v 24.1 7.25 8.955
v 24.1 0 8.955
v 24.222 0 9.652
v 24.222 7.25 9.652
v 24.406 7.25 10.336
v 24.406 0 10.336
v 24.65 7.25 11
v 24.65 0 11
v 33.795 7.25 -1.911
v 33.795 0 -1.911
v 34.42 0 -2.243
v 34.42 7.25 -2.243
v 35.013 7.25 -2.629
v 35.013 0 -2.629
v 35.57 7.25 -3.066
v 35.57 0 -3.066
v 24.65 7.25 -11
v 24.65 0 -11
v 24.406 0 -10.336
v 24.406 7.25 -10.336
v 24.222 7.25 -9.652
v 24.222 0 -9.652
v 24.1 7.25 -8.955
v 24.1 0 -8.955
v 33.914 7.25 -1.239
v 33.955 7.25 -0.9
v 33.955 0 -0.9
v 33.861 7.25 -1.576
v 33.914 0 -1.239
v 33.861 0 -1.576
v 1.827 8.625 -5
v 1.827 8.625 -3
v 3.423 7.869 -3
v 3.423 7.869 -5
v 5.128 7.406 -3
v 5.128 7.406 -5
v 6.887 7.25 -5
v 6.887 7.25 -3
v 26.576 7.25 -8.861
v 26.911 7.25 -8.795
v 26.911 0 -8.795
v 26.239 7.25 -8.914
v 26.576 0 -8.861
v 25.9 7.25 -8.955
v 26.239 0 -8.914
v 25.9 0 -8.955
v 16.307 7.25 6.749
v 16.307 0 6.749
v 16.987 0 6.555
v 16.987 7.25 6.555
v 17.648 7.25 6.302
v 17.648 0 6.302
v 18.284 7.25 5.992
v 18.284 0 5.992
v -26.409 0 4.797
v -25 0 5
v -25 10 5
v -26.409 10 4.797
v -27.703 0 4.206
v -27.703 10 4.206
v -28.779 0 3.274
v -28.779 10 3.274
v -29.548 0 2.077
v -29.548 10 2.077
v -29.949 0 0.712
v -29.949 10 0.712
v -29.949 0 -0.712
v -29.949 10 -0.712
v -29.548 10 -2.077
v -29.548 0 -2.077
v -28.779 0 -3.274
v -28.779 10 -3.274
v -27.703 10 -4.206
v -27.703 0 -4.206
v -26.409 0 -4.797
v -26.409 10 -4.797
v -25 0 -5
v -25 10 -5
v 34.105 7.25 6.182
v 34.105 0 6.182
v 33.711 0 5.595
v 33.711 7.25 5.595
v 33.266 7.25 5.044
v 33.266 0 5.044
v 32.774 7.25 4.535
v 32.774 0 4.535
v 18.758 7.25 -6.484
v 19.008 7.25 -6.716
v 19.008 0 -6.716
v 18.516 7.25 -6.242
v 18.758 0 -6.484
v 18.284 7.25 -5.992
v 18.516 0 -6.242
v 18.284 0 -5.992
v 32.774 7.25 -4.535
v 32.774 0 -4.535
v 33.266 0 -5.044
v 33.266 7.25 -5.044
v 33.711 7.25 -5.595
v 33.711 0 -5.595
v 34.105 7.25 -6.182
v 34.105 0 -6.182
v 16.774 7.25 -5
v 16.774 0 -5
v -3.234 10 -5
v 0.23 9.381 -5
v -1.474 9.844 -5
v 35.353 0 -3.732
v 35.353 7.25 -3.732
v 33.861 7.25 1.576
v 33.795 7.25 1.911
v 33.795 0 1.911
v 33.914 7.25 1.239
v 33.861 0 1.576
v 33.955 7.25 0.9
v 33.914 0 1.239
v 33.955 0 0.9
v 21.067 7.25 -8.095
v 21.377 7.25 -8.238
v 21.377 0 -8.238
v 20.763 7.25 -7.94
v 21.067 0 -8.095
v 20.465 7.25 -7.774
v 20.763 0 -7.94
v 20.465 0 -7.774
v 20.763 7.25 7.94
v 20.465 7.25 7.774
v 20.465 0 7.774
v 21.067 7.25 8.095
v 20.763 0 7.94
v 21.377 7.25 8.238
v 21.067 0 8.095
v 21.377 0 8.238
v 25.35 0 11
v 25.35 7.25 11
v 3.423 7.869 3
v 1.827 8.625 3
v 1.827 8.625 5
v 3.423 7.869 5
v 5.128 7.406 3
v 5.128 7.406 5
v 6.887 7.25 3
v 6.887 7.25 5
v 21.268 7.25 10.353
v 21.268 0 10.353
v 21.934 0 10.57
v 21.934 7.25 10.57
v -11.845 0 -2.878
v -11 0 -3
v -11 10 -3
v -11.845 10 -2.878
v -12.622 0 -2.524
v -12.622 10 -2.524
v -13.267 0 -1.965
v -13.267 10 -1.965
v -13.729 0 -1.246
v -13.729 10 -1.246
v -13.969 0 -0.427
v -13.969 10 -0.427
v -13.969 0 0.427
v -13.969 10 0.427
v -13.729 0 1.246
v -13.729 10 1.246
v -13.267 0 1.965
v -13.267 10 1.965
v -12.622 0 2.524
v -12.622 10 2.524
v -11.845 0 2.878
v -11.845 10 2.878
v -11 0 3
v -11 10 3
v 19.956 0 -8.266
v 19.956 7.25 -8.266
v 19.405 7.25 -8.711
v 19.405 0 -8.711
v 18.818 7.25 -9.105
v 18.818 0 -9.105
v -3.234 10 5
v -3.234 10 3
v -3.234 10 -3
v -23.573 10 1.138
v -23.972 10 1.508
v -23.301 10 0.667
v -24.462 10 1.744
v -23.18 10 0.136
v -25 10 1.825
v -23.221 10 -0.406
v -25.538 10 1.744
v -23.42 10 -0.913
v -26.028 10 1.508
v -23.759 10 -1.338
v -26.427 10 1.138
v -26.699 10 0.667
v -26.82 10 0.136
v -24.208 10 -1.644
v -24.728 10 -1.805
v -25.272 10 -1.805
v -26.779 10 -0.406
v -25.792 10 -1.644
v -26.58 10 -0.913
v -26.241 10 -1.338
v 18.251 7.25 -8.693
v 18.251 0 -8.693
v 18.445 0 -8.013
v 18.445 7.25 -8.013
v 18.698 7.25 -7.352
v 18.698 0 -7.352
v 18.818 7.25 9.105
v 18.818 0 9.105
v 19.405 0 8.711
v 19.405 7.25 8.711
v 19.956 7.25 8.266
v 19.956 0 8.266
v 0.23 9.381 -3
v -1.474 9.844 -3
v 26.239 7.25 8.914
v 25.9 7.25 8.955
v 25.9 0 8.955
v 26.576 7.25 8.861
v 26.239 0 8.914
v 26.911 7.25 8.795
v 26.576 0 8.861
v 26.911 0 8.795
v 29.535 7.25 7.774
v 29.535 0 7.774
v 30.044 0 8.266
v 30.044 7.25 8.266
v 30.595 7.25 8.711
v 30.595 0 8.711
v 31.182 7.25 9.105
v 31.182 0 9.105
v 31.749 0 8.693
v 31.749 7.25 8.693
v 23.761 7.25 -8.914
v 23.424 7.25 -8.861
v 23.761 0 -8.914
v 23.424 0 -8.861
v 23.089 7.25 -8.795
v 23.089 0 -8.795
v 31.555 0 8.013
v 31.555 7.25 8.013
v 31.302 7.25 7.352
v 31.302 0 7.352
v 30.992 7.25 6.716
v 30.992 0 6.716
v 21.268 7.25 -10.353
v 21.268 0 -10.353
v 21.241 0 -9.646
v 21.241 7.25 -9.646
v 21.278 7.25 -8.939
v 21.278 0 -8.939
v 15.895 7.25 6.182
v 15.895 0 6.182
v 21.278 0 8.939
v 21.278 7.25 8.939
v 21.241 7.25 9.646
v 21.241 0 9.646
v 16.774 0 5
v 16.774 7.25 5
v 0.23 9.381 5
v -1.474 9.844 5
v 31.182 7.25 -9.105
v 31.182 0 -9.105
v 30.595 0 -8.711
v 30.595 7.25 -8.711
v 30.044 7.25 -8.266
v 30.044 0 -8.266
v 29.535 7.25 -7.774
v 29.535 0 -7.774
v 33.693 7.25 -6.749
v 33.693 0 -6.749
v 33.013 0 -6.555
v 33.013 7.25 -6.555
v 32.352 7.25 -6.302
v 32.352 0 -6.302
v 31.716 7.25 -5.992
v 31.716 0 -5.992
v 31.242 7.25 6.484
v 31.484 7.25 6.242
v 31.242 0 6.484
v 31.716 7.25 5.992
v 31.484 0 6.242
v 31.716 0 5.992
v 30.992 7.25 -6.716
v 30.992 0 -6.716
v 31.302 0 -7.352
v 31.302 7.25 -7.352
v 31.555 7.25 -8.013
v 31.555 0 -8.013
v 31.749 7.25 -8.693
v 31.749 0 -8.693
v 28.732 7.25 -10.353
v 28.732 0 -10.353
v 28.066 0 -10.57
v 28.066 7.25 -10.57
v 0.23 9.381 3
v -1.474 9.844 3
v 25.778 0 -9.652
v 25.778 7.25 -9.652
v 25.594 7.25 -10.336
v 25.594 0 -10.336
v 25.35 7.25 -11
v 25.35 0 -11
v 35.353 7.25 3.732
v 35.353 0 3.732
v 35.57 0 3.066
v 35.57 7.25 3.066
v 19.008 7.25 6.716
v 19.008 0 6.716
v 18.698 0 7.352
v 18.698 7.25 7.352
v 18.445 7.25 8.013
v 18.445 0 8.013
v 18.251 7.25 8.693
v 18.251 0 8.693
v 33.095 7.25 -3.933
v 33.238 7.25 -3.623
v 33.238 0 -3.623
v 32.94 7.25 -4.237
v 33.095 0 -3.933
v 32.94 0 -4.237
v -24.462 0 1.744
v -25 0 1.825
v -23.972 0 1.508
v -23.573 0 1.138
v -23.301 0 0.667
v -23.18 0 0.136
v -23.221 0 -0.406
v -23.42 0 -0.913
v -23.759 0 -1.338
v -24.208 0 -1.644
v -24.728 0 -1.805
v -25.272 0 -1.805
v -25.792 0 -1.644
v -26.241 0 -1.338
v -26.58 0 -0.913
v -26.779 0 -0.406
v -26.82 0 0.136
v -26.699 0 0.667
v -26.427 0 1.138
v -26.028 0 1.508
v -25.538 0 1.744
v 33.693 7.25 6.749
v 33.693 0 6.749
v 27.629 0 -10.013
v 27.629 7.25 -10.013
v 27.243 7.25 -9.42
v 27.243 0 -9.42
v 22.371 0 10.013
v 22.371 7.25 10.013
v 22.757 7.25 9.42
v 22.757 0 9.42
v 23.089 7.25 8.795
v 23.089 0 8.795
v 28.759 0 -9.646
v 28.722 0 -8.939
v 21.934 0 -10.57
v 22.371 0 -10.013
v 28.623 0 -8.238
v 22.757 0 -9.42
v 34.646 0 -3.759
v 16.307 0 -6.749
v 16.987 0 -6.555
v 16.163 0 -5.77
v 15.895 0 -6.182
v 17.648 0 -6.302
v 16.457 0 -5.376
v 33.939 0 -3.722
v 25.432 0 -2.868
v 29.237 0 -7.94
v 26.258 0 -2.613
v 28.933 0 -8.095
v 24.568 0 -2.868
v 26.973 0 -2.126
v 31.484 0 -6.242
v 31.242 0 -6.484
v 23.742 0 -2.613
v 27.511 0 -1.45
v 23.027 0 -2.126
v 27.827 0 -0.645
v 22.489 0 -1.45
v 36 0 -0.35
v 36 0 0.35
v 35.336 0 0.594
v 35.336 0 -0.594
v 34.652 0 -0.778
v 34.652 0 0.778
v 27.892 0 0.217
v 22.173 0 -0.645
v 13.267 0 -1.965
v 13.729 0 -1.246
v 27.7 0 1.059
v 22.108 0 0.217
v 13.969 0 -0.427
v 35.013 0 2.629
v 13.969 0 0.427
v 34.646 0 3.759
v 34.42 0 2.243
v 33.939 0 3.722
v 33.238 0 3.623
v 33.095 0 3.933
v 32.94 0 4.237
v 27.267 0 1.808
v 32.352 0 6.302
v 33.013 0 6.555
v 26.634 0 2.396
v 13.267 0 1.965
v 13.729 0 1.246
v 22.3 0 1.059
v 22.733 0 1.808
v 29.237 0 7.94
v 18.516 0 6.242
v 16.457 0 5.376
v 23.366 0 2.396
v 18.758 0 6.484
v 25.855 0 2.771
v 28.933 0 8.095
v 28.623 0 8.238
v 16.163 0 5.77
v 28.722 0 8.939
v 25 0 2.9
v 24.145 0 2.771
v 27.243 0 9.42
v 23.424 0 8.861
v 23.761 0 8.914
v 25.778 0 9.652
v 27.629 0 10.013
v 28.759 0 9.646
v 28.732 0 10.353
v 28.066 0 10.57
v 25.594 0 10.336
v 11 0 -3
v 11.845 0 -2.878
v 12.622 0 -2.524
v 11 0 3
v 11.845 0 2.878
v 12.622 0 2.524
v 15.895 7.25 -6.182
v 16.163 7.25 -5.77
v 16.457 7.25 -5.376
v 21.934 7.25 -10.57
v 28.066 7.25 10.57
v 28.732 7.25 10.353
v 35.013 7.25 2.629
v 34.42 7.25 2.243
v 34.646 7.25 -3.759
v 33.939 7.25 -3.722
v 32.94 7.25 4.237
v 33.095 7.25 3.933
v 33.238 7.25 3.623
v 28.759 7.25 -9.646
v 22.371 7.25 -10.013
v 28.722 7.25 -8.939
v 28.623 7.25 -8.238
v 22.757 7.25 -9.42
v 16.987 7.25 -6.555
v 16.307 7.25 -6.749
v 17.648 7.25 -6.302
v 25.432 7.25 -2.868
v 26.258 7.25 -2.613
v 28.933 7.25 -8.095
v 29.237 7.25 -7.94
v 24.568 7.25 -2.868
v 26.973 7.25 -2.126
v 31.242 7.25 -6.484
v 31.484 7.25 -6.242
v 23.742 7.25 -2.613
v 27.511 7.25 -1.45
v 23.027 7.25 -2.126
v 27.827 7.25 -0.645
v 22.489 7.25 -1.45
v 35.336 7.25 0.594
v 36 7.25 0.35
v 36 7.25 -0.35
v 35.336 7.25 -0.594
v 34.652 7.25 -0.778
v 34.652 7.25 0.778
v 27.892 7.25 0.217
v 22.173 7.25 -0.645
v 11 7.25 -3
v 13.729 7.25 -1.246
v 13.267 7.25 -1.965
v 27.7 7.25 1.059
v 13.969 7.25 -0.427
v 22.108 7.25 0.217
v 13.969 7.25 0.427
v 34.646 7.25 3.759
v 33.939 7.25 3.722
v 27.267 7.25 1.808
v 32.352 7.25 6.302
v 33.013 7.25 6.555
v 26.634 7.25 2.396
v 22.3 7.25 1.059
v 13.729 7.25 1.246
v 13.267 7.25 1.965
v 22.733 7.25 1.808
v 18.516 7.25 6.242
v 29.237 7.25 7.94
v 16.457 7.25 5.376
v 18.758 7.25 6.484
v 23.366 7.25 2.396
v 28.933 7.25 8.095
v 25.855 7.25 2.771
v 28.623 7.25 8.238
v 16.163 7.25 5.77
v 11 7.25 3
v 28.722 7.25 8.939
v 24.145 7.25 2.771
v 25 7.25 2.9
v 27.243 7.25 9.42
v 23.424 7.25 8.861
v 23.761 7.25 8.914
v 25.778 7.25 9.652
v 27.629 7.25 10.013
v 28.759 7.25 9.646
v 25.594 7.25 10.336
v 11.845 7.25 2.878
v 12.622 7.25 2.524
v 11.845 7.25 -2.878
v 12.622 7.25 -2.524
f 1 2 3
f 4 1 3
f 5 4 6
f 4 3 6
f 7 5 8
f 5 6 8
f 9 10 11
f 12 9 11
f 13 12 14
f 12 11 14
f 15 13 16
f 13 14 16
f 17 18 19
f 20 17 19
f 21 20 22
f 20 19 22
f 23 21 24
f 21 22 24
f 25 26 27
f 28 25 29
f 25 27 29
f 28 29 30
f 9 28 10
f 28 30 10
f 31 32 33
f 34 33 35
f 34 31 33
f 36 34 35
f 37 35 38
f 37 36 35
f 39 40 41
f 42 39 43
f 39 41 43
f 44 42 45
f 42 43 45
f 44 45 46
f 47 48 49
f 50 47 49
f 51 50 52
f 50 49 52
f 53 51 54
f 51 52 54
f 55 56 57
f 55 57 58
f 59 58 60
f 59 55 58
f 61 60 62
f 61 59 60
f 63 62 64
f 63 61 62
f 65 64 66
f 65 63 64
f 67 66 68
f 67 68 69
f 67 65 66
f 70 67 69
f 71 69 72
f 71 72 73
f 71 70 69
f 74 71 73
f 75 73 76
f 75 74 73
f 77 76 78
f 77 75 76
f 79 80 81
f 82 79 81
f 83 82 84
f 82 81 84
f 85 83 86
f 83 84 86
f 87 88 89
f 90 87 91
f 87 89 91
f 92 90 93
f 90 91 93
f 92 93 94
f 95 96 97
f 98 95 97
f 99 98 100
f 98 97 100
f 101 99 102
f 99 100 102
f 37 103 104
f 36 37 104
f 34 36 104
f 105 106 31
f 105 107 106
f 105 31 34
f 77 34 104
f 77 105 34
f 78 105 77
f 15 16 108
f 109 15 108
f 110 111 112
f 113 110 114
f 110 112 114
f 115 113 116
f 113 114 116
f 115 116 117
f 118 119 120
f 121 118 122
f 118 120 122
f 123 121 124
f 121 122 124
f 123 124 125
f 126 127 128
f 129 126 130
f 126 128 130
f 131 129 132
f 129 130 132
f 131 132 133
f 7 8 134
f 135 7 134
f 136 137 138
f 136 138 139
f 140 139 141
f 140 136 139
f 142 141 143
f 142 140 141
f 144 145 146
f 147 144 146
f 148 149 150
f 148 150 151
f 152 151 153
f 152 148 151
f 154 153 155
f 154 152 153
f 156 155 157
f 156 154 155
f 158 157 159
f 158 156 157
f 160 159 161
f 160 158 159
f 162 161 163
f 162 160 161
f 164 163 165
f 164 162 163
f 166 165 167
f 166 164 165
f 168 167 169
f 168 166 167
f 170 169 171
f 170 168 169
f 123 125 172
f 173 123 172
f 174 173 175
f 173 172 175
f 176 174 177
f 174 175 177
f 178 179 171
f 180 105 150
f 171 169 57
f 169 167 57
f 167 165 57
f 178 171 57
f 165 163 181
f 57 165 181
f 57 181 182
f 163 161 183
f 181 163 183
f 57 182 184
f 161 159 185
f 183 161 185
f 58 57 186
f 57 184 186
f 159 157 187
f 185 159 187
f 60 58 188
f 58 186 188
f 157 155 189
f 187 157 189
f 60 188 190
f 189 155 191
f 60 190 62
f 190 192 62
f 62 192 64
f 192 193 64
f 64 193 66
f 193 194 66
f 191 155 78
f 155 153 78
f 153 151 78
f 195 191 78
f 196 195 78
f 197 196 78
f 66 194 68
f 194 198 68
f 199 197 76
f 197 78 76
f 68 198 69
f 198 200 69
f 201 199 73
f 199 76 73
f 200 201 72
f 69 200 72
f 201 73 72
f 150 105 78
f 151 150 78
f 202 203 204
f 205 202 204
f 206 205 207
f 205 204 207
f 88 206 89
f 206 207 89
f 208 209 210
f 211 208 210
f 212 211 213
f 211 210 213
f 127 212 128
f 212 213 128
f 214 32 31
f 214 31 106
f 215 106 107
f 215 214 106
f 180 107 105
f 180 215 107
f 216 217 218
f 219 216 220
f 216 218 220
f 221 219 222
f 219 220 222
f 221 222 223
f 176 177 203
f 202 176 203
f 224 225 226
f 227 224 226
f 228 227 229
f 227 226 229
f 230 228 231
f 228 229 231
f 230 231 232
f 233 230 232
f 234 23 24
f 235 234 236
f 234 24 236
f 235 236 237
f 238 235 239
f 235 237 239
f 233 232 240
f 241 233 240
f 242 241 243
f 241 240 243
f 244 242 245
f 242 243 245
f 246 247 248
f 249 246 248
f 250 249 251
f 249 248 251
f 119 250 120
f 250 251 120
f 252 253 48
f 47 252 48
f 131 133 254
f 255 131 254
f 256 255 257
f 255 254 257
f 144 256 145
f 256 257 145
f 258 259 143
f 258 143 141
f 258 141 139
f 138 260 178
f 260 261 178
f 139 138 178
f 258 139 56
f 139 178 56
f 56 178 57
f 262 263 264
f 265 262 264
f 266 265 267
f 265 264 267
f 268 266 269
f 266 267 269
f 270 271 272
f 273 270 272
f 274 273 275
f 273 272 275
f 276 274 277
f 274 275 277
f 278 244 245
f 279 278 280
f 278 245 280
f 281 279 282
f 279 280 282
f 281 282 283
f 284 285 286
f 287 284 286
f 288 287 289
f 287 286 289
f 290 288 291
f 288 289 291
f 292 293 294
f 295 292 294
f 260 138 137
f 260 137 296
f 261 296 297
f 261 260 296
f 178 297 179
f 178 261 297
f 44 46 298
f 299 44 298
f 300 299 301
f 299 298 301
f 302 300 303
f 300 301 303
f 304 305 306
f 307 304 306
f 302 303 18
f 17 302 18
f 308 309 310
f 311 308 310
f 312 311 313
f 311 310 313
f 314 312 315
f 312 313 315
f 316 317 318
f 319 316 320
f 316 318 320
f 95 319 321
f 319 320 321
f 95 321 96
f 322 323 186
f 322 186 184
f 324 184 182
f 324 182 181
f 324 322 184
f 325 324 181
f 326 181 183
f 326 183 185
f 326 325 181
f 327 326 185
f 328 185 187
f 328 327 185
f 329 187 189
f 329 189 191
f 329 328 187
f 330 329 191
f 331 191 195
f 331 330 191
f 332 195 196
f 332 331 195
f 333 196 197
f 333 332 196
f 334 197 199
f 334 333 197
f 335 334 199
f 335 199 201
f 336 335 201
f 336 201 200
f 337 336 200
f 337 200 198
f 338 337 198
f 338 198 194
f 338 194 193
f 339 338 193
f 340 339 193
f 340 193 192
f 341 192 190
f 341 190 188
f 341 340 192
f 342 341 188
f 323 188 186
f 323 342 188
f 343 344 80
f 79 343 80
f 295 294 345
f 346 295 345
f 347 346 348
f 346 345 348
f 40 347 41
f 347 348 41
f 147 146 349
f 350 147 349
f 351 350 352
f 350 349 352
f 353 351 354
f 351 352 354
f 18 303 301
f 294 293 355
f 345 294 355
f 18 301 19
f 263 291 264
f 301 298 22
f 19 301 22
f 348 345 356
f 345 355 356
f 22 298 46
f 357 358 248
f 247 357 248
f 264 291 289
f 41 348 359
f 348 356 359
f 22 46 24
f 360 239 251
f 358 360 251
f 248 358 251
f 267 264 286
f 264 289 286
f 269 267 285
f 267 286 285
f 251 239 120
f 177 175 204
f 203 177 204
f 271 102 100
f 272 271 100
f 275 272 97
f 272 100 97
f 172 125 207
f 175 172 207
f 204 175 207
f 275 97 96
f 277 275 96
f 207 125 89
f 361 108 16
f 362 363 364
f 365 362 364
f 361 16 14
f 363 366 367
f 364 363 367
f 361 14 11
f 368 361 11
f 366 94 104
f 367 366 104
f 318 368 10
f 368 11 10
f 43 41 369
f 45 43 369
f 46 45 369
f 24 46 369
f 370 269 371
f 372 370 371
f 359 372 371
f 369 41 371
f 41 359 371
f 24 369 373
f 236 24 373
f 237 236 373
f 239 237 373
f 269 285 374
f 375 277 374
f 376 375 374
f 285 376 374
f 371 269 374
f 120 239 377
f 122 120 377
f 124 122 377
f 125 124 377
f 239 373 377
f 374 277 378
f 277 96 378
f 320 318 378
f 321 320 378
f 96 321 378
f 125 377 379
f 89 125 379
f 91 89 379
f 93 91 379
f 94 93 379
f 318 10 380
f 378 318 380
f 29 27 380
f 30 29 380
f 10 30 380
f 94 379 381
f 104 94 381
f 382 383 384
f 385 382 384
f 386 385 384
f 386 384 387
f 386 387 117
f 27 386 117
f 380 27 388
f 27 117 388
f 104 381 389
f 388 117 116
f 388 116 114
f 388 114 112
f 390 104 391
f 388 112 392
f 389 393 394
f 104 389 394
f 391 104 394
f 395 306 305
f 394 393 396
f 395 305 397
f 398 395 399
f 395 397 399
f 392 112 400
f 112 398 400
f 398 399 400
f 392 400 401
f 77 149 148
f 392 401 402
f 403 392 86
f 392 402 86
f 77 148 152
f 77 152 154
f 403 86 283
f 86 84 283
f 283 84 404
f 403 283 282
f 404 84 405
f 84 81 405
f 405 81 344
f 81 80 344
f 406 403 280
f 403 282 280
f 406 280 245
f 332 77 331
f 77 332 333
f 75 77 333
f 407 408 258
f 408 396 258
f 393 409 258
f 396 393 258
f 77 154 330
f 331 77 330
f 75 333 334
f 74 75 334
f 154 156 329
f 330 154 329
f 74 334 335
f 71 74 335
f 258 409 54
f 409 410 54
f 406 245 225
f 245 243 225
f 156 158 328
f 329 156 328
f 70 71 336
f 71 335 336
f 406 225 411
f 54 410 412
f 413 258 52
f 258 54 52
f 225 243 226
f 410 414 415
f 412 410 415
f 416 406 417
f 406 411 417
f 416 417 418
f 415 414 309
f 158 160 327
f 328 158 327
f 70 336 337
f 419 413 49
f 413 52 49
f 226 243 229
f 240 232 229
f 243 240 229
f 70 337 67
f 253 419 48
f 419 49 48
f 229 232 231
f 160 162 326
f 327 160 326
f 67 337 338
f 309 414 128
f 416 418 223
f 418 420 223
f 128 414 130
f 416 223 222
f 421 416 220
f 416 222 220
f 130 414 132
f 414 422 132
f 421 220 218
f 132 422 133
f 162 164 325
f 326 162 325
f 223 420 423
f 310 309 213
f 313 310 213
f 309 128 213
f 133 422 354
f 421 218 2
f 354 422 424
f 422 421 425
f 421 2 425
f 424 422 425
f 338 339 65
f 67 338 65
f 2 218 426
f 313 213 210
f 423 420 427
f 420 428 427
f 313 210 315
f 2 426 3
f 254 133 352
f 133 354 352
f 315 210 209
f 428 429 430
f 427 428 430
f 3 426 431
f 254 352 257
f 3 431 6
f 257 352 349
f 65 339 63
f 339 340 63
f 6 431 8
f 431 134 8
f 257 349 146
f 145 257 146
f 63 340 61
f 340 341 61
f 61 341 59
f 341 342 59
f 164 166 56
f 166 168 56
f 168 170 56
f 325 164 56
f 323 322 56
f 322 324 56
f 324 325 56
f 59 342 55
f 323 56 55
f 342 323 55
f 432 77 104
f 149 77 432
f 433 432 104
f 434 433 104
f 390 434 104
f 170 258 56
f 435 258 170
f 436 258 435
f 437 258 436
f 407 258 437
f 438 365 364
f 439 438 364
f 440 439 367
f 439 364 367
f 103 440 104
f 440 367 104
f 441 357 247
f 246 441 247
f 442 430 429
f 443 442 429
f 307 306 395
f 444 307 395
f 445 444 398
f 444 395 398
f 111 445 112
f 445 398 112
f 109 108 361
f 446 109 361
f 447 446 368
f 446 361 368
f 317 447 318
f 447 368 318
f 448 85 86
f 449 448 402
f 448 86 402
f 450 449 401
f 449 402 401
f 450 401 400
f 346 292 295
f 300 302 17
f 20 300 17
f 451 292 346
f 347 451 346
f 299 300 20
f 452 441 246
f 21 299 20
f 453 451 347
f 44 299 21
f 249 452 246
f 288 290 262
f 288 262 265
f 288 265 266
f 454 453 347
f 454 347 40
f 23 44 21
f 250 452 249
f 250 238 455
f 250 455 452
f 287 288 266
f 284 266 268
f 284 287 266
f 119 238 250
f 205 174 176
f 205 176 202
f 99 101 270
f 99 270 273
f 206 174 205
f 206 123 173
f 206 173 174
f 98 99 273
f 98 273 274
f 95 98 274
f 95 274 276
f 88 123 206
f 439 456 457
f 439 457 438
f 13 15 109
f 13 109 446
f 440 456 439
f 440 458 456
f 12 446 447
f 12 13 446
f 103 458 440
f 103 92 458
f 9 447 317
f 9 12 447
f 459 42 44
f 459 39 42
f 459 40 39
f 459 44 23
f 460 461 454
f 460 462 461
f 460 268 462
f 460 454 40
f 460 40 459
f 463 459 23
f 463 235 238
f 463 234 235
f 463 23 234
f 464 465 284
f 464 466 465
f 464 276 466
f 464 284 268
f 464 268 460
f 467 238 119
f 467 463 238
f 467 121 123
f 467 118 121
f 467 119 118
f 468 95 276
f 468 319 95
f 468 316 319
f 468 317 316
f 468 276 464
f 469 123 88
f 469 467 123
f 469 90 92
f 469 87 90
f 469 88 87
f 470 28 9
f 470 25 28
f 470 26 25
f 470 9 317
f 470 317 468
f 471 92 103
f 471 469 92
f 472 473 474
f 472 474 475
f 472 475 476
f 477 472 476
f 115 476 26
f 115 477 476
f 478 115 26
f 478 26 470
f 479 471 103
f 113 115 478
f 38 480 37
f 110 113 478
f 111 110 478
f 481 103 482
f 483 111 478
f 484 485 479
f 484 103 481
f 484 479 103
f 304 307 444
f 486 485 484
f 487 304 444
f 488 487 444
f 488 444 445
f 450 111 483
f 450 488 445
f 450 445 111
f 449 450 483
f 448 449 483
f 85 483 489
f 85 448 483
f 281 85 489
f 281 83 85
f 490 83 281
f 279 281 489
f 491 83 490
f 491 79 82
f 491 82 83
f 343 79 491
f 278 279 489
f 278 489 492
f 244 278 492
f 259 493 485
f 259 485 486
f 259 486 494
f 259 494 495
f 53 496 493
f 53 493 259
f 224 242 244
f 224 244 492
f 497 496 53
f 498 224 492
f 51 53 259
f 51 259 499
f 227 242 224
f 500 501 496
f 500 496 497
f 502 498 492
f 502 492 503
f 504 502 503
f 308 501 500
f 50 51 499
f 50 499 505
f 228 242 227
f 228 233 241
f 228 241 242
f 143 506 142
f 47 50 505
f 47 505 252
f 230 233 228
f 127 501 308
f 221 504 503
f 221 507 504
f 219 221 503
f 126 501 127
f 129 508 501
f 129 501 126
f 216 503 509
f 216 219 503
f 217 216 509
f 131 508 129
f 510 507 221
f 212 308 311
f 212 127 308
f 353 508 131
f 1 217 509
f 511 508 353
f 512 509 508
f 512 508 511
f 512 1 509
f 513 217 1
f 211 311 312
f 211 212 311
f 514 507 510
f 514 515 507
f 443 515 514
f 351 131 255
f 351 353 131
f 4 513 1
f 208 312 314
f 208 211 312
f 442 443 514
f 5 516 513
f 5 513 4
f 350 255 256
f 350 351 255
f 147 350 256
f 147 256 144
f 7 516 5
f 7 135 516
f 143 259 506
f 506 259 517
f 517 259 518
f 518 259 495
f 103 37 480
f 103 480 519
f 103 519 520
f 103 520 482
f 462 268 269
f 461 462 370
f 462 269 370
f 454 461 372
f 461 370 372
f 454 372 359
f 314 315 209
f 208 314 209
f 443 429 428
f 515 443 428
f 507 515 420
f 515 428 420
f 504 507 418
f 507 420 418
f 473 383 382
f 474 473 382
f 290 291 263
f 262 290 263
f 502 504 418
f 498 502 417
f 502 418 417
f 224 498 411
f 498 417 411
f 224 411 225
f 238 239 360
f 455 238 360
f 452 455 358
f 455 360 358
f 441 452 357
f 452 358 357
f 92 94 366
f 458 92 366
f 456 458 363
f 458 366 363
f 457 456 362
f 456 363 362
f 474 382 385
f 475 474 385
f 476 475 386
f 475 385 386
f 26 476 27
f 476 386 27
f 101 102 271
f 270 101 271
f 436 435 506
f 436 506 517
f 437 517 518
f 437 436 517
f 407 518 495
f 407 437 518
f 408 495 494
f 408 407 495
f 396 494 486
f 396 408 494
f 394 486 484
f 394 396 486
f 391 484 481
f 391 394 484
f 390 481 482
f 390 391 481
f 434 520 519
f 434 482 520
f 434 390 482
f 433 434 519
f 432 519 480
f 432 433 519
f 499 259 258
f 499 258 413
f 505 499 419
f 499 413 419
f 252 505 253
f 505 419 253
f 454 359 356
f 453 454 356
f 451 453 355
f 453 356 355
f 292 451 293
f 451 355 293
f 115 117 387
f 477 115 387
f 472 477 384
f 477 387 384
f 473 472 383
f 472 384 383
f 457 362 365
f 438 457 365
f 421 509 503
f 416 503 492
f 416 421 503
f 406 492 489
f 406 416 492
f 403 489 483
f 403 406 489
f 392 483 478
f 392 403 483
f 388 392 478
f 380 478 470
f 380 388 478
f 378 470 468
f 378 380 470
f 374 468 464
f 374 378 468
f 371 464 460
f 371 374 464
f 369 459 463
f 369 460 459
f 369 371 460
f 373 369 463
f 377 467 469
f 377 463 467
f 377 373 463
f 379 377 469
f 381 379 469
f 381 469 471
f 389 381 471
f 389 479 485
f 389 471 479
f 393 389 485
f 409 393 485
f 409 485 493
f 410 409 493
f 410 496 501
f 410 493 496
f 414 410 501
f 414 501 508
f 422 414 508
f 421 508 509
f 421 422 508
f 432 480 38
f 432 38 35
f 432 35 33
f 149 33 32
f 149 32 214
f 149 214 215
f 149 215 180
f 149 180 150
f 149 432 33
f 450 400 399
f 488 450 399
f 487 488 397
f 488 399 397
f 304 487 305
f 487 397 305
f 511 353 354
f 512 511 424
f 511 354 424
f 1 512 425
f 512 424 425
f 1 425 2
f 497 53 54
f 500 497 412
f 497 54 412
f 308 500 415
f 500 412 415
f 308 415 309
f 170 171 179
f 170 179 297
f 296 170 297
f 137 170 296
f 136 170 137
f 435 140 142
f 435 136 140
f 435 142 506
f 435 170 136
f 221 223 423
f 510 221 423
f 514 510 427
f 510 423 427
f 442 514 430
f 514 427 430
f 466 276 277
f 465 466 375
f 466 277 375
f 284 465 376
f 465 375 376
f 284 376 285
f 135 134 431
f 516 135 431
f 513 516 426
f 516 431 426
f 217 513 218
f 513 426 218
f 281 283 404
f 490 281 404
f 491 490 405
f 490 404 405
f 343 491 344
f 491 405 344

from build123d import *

# Parameters (mm, degrees)
SKIZZE2_R                       = 1.825
SKIZZE2_R_2                     = 2.9
AUFSATZ_LINEAR_AUSTRAGEN1_DEPTH = 10
SCHNITT_LINEAR_START            = -2.75
SCHNITT_LINEAR_AUSTRAGEN1_DEPTH = 2.75
VERRUNDUNG1_R                   = 10
VERRUNDUNG2_R                   = 10
AUFSATZ_LINEAR_START            = -7.25
SKIZZE5_R                       = 9
SKIZZE5_R_2                     = 5
AUFSATZ_LINEAR_AUSTRAGEN2_DEPTH = 7.25
AUFSATZ_LINEAR_AUSTRAGEN3_DEPTH = 7.25
KREISMUSTER1_COUNT              = 20
SCHNITT_LINEAR_AUSTRAGEN3_DEPTH = 39.948684188


with BuildPart() as part:
    # Skizze2 → Aufsatz-Linear austragen1 (new body)
    with BuildSketch(Plane(origin=(0, 0, 0), x_dir=(1, 0, 0), z_dir=(0, 1, 0))):
        with BuildLine():
            Line((-25, 5), (25, 5))
            ThreePointArc((25, 5), (30, 0), (25, -5))
            Line((25, -5), (-25, -5))
            ThreePointArc((-25, -5), (-30, 0), (-25, 5))
        make_face()
        with Locations(Location((-25, 0, 0), (0, 0, 270))):
            Circle(SKIZZE2_R, mode=Mode.SUBTRACT)
        with Locations(Location((25, 0, 0), (0, 0, 270))):
            Circle(SKIZZE2_R_2, mode=Mode.SUBTRACT)
    extrude(amount=AUFSATZ_LINEAR_AUSTRAGEN1_DEPTH)

    # Skizze4 → Schnitt-Linear austragen1 (cut)
    with BuildSketch(Plane(origin=(0, 10, 0), x_dir=(1, 0, 0), z_dir=(0, 1, 0)).offset(SCHNITT_LINEAR_START)):
        with BuildLine():
            Line((25, 5), (0, 5))
            Line((0, 5), (0, -5))
            Line((0, -5), (25, -5))
            ThreePointArc((25, -5), (30, 0), (25, 5))
        make_face()
    extrude(amount=SCHNITT_LINEAR_AUSTRAGEN1_DEPTH, mode=Mode.SUBTRACT)

    # Verrundung1
    # the kernel refuses this fillet: 10 mm, written as the material it adds along each edge
    with BuildSketch(Plane(origin=(0, 7.25, -5), x_dir=(1, 0, 0), z_dir=(0, 0, 1))) as verrundung1_piece_1:
        with BuildLine():
            CenterArc((6.887488657, 10), VERRUNDUNG1_R, 226.468847833, 43.531152167)
            Line((0, 2.75), (-0.137749773, 2.605))
            ThreePointArc((-0.137749773, 2.605), (-0.2, 1.375), (-0.2, 0))
            Line((-0.2, 0), (0, -0.2))
            Line((0, -0.2), (6.887488657, -0.2))
            Line((6.887488657, -0.2), (6.887488657, 0))
        make_face()
    extrude(amount=10)

    # Verrundung2
    verrundung2_edges = [part.edges().sort_by_distance(p)[0] for p in [
        (0, 10, 0),
    ]]
    fillet(verrundung2_edges, radius=VERRUNDUNG2_R)

    # Skizze5 → Aufsatz-Linear austragen2 (add)
    with BuildSketch(Plane(origin=(0, 7.25, 0), x_dir=(1, 0, 0), z_dir=(0, 1, 0)).offset(AUFSATZ_LINEAR_START)):
        with Locations((25, 0)):
            Circle(SKIZZE5_R)
        with Locations((25, 0)):
            Circle(SKIZZE5_R_2, mode=Mode.SUBTRACT)
    extrude(amount=AUFSATZ_LINEAR_AUSTRAGEN2_DEPTH)

    # Skizze6 → Aufsatz-Linear austragen3 (add)
    with BuildSketch(Plane(origin=(0, 7.25, 0), x_dir=(1, 0, 0), z_dir=(0, 1, 0)).offset(AUFSATZ_LINEAR_START)):
        with BuildLine():
            Line((36, -0.35), (36, 0.35))
            ThreePointArc((36, 0.35), (34.995800842, 0.693259833), (33.954886934, 0.9))
            ThreePointArc((33.954886934, 0.9), (34, 0), (33.954886934, -0.9))
            ThreePointArc((33.954886934, -0.9), (34.995800842, -0.693259833), (36, -0.35))
        make_face()
    aufsatz_linear_austragen3 = extrude(amount=AUFSATZ_LINEAR_AUSTRAGEN3_DEPTH)

    # Kreismuster1: Aufsatz-Linear austragen3 ×20 about axis
    kreismuster1_axis = Axis((25, 0, 0), (0, 1, 0))
    for i in range(1, KREISMUSTER1_COUNT):
        add(aufsatz_linear_austragen3.rotate(kreismuster1_axis, i * 360 / KREISMUSTER1_COUNT))

    # Skizze9 → Schnitt-Linear austragen3 (cut, through all)
    with BuildSketch(Plane.XZ):
        with BuildLine():
            Line((-11, 3), (11, 3))
            ThreePointArc((11, 3), (14, 0), (11, -3))
            Line((11, -3), (-11, -3))
            ThreePointArc((-11, -3), (-14, 0), (-11, 3))
        make_face()
    extrude(amount=-SCHNITT_LINEAR_AUSTRAGEN3_DEPTH, mode=Mode.SUBTRACT)


solid = part.part
